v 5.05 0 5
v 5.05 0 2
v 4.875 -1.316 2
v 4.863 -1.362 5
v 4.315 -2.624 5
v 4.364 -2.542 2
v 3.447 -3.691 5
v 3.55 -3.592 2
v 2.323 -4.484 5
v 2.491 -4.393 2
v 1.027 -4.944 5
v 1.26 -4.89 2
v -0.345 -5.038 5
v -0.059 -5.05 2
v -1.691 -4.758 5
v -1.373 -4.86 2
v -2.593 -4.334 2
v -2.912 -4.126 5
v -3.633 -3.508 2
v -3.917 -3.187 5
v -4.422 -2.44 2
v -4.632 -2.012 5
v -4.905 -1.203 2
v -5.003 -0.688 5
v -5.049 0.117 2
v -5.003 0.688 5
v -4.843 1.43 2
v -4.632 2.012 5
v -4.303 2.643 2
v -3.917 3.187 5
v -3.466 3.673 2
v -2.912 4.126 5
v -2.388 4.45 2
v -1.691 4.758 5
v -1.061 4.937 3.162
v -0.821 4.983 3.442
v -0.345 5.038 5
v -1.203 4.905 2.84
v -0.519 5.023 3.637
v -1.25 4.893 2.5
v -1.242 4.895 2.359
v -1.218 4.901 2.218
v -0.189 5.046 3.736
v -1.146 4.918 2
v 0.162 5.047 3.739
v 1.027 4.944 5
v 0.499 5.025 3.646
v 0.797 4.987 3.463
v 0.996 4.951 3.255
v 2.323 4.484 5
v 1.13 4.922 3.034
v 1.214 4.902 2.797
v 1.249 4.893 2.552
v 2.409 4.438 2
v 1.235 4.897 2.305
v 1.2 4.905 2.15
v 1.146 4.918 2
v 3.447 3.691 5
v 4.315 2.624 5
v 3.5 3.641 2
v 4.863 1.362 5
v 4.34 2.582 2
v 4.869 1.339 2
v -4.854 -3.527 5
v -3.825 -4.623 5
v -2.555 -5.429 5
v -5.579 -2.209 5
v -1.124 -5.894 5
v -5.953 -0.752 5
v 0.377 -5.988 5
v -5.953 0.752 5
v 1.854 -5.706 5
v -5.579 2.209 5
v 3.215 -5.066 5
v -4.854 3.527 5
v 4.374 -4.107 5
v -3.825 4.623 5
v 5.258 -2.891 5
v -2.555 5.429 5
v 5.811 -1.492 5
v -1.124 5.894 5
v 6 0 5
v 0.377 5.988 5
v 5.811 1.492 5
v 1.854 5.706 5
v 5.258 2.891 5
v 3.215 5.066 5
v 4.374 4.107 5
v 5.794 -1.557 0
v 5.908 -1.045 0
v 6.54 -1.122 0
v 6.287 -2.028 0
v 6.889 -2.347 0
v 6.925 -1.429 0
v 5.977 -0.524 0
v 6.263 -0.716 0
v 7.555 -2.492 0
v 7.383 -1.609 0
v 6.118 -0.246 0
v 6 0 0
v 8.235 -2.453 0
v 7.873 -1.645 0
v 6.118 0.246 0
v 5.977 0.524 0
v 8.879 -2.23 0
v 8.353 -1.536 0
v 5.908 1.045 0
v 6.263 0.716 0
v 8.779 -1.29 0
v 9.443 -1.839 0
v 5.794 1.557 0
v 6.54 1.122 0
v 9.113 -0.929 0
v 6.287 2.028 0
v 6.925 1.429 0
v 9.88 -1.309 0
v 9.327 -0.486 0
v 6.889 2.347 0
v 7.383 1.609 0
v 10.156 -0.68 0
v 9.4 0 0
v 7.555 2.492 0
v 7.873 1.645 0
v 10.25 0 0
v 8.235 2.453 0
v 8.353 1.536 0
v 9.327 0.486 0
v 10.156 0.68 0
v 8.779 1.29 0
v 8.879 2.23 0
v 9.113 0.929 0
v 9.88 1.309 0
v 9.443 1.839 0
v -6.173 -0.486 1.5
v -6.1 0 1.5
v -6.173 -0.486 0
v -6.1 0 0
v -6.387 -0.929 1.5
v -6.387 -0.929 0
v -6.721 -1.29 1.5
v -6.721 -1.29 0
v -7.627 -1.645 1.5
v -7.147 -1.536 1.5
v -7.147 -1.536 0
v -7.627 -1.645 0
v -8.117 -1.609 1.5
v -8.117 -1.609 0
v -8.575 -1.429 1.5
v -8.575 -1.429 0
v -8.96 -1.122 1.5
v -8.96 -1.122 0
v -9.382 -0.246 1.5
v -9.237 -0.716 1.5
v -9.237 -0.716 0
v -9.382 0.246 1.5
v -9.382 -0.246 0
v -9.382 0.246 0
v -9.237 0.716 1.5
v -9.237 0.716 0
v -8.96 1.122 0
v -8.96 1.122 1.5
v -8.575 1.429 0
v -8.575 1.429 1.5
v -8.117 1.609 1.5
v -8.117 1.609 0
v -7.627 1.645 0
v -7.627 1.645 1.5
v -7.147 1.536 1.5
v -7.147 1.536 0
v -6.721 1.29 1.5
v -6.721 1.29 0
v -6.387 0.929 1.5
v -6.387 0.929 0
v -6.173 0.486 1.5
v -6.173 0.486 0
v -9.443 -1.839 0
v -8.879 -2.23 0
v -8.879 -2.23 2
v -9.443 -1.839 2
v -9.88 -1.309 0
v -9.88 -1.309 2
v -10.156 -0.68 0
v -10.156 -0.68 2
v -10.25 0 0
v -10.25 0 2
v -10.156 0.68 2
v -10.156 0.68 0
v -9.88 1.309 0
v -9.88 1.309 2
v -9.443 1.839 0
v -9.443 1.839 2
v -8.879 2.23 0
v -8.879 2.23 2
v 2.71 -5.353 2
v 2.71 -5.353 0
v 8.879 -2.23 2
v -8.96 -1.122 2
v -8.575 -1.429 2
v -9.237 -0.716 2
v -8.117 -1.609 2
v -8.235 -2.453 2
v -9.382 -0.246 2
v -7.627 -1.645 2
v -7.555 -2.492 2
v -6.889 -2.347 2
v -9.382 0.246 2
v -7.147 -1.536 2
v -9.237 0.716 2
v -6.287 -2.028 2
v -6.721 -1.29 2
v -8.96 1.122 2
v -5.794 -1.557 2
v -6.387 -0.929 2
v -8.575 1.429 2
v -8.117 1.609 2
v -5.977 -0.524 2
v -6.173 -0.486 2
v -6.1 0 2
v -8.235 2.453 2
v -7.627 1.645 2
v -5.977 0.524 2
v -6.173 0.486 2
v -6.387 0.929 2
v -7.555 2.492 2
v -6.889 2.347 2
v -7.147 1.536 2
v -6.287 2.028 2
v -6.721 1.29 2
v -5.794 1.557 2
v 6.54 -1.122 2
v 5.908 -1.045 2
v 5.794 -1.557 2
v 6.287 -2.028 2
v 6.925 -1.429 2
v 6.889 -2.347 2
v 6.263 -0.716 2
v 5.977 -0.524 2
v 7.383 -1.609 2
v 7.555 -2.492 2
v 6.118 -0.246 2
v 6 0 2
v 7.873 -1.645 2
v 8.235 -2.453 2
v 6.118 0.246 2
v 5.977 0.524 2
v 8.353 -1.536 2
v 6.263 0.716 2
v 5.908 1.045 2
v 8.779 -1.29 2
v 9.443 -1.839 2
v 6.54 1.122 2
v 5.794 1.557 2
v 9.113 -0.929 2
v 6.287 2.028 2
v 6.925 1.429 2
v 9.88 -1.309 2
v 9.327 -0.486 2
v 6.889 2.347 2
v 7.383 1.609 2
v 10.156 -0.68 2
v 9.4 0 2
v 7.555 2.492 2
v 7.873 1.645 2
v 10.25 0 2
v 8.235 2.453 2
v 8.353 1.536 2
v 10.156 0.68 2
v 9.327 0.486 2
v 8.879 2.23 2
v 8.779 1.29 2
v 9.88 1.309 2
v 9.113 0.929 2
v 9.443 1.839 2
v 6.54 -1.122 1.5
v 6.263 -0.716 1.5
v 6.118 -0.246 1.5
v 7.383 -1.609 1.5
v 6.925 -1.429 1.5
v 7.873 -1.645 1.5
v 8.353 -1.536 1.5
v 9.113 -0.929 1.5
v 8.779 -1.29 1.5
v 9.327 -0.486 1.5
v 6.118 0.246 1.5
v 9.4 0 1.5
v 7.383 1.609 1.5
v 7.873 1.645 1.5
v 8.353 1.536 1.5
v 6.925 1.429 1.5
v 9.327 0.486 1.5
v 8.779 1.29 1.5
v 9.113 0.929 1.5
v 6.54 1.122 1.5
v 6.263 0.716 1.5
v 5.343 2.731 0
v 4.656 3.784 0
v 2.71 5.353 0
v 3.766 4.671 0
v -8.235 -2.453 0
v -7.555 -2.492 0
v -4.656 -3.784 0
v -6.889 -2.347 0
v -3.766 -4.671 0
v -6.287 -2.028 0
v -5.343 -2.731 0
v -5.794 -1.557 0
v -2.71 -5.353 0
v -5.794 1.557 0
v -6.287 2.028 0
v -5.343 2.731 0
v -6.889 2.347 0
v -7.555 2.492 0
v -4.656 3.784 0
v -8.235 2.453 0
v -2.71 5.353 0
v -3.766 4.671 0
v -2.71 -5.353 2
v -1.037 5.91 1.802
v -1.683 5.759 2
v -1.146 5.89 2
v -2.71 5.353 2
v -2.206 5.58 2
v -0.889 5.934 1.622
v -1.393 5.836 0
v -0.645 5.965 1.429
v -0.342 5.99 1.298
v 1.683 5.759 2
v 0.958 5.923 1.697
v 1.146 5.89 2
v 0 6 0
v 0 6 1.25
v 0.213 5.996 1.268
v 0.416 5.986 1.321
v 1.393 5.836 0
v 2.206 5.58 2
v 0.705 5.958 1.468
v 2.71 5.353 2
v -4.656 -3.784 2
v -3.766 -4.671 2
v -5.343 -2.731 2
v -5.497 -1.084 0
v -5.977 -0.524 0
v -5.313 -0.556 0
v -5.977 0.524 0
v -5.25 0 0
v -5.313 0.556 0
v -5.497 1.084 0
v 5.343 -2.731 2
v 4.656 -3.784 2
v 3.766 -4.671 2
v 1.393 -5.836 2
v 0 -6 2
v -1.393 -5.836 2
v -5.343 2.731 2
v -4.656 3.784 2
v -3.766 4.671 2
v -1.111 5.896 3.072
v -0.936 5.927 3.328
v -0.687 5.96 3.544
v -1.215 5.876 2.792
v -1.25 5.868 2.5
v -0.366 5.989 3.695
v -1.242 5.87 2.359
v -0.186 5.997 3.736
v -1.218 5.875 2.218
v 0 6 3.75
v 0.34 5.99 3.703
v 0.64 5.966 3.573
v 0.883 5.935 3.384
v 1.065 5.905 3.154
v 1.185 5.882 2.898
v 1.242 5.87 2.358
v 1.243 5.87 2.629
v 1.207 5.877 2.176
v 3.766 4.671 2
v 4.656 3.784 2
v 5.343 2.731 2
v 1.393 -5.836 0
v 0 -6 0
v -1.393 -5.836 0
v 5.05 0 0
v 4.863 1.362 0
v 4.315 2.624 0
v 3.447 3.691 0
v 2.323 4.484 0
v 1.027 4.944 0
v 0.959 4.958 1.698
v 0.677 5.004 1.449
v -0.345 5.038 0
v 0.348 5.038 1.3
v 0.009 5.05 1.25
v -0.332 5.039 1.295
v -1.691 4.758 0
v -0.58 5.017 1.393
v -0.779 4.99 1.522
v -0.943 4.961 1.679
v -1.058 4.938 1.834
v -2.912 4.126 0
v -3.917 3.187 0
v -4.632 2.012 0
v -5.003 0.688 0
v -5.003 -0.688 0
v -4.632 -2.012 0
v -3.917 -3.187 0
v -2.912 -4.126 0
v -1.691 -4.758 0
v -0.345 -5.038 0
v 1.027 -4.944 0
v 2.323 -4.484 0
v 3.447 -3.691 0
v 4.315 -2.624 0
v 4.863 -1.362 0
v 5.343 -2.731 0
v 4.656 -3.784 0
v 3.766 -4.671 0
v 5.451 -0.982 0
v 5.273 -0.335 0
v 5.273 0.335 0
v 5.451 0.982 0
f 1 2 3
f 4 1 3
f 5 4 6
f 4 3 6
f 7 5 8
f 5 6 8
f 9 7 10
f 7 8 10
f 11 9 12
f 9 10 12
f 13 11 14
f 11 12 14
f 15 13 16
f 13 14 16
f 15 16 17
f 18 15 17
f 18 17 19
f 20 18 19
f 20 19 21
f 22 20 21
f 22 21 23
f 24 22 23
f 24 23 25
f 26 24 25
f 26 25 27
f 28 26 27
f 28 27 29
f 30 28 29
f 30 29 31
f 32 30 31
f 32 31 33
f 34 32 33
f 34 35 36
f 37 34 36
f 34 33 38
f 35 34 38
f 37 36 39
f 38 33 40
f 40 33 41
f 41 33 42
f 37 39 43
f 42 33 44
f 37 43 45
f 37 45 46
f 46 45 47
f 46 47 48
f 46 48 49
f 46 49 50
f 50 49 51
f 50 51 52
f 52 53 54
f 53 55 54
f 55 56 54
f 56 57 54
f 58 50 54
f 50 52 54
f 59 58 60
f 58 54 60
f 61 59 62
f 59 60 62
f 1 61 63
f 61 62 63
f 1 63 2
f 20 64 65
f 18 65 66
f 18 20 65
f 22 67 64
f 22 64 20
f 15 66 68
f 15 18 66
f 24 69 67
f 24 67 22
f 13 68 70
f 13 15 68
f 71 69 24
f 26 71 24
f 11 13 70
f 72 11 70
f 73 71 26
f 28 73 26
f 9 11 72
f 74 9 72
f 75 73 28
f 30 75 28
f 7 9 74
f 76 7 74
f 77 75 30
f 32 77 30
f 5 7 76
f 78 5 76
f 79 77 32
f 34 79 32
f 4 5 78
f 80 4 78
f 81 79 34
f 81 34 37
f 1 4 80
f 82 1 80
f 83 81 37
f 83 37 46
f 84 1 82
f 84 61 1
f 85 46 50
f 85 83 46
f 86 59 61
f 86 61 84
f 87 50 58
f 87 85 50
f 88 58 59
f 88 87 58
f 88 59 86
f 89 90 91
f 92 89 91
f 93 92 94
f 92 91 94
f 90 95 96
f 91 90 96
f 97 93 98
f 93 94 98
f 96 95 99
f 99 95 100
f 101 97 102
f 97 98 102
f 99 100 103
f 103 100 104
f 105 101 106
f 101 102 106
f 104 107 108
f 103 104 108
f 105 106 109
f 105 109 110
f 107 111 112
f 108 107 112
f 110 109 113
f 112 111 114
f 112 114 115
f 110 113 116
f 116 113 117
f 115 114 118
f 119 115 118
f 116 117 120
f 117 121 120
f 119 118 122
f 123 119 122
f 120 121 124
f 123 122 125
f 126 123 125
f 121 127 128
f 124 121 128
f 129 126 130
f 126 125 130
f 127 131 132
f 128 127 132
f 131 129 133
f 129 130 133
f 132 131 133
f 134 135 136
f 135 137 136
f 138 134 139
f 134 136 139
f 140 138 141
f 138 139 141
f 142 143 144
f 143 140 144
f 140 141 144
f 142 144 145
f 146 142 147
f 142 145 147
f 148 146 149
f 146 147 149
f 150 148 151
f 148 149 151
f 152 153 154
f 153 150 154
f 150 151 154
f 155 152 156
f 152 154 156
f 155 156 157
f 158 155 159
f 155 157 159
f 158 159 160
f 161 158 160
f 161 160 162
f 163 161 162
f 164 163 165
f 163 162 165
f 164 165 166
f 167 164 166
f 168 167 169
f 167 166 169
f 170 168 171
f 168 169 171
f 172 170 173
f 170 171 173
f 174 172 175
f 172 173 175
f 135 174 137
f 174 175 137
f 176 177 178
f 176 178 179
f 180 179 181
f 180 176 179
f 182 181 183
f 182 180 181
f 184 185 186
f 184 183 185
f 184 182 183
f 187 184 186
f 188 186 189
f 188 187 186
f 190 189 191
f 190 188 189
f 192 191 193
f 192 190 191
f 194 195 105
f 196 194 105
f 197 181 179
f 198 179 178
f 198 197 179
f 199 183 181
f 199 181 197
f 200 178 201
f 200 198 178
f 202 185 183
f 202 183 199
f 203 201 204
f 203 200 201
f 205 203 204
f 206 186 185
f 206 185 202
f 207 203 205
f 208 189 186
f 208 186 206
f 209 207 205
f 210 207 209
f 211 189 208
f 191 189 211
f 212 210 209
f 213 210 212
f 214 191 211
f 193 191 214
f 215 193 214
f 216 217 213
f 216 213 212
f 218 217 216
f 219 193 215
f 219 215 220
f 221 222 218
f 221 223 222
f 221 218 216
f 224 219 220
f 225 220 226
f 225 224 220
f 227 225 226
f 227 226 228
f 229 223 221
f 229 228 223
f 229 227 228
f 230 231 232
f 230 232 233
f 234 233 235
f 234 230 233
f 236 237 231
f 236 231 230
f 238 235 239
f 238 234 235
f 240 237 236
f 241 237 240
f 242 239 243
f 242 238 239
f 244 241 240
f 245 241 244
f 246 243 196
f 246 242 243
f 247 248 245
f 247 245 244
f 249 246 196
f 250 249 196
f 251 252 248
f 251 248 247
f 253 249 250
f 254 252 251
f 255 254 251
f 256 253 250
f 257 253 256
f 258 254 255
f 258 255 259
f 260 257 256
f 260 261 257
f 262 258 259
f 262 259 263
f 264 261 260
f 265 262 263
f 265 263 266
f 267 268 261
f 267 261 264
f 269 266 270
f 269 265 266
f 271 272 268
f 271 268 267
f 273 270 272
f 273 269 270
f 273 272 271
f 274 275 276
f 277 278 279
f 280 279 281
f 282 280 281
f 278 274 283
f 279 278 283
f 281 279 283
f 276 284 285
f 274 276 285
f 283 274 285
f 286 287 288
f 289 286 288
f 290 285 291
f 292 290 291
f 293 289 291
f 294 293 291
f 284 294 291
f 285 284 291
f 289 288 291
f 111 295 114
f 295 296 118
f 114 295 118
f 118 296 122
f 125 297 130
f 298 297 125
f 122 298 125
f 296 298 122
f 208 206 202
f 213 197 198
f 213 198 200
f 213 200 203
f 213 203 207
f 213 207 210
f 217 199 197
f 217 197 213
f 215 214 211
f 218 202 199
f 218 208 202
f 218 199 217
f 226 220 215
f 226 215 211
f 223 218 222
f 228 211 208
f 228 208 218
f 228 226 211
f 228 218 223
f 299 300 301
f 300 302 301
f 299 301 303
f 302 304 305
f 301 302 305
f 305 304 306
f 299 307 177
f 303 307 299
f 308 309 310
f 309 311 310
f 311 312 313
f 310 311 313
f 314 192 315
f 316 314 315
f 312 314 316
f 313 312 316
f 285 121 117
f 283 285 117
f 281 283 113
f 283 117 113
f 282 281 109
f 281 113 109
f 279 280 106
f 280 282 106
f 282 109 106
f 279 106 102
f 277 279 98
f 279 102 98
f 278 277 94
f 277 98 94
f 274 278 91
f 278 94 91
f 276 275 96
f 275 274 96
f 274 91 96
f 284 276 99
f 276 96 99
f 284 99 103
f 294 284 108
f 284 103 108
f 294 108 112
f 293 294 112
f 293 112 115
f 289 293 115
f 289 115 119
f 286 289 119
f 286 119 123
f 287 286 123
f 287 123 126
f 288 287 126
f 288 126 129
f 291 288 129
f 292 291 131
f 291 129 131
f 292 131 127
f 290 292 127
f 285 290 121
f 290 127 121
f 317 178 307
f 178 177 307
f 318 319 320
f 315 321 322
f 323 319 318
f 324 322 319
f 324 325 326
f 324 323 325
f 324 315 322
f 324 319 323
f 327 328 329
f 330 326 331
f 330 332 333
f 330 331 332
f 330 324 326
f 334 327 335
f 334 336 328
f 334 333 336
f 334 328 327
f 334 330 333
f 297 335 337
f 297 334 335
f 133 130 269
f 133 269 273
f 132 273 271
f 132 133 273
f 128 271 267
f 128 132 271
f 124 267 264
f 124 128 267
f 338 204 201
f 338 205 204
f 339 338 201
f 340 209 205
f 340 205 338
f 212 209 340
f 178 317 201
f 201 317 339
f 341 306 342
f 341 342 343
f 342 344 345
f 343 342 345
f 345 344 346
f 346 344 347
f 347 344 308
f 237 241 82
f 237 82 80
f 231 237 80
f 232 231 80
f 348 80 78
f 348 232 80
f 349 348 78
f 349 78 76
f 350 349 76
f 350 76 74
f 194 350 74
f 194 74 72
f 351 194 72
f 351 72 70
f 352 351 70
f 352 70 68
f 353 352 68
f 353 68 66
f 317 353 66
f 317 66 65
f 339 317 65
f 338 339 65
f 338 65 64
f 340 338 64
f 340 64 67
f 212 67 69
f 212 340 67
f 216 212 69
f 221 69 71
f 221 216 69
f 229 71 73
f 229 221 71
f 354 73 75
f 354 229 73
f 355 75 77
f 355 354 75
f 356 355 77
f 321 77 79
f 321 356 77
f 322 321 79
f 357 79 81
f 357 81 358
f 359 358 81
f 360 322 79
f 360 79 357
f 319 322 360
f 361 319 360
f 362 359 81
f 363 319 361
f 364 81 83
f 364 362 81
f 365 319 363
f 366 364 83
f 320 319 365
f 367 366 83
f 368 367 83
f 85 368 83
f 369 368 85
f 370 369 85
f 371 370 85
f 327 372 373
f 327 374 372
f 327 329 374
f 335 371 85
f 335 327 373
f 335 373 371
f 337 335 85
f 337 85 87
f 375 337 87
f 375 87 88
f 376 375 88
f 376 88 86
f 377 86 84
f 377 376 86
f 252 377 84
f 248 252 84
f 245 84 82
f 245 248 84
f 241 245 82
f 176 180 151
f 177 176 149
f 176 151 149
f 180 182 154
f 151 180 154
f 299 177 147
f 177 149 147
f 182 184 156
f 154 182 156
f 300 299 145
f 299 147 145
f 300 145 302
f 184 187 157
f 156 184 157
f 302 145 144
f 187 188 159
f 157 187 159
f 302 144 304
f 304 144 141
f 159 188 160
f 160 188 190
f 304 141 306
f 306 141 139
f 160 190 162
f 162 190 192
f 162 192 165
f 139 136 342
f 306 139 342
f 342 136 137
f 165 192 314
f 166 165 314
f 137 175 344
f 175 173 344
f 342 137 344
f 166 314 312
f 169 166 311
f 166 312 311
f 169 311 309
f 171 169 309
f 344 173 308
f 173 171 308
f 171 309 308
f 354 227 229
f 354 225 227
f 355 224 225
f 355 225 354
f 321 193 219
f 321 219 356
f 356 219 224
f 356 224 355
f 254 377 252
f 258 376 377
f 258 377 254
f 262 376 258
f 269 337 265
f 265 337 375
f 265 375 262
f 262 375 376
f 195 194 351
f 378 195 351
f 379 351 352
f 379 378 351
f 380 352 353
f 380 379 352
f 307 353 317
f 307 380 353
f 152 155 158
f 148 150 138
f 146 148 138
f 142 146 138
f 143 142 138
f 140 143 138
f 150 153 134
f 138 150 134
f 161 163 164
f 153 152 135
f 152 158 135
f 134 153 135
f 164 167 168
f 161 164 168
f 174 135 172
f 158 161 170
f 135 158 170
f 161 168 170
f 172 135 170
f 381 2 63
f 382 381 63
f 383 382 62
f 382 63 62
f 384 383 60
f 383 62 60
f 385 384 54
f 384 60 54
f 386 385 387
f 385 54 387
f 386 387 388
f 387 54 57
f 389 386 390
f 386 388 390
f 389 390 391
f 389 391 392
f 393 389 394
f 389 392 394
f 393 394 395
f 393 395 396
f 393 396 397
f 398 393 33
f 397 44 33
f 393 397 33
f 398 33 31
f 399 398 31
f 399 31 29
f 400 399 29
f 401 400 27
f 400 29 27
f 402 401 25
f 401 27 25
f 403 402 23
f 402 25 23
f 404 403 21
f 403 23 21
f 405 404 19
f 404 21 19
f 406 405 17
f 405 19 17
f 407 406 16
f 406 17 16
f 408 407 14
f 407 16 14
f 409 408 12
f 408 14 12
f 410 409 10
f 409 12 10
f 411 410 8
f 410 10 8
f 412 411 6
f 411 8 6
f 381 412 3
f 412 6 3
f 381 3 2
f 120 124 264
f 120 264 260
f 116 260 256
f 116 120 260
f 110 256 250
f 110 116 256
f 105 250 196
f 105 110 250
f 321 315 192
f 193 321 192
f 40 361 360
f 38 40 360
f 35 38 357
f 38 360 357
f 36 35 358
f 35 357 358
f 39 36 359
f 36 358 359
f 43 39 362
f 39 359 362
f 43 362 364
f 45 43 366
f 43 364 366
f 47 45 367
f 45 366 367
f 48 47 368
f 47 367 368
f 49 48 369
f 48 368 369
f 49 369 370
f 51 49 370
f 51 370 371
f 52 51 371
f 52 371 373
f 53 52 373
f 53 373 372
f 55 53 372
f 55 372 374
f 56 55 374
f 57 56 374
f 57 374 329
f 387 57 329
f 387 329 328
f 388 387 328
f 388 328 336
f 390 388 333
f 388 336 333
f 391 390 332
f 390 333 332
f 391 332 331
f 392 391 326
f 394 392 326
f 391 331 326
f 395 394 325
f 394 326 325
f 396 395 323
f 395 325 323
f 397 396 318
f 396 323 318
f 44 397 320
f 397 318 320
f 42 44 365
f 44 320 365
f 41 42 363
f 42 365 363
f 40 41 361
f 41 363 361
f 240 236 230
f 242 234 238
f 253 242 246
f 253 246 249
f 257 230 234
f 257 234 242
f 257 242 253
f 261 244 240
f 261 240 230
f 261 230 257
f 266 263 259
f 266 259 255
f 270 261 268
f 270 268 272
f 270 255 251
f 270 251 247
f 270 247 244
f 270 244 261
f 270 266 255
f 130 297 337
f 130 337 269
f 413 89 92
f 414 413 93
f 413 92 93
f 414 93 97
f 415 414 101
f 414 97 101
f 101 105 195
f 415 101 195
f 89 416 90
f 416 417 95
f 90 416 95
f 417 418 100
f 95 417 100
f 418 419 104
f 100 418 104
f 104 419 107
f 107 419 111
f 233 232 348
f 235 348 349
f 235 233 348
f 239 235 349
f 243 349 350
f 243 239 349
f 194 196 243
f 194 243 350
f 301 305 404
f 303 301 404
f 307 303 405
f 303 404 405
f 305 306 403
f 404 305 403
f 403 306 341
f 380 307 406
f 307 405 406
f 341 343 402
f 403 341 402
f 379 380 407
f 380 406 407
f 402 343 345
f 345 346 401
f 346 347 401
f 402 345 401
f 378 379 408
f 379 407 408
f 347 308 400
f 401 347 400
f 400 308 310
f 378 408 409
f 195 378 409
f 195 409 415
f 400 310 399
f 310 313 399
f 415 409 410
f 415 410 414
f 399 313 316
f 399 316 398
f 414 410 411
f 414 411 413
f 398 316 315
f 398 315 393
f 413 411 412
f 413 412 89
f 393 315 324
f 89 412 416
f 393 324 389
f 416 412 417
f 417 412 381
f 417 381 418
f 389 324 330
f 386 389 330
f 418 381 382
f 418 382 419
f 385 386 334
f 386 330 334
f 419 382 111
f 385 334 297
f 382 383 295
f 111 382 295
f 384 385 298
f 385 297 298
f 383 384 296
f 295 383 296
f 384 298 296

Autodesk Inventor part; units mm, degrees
ref_plane "YZ Plane" through (0, 0, 0) normal (1, 0, 0) x (0, 1, 0)
ref_plane "XY Plane" through (0, 0, 0) normal (0, 0, 1) x (1, 0, 0)
sketch "Sketch2" plane through (0, 0, 0) normal (0, 0, 1) x (1, 0, 0)
  circle A0 centre (0, 0) radius 5.05
  circle A1 centre (-7.75, 0) radius 1.65
  circle A2 centre (-7.75, 0) radius 2.5
  circle A3 centre (0, 0) radius 6
  line L0 (-2.7097, 5.3533) -> (-8.879, 2.2305)
  line L1 (-8.879, -2.2305) -> (-2.7097, -5.3533)
  circle A4 centre (7.75, 0) radius 1.65
  circle A5 centre (7.75, 0) radius 2.5
  line L2 (2.7097, 5.3533) -> (8.879, 2.2305)
  line L3 (2.7097, -5.3533) -> (8.879, -2.2305)
  line L4 (0, 0) -> (7.75, 0) construction
  line L5 (0, 0) -> (-7.75, 0) construction
  dimension "d0" = 10.1
  dimension "d1" = 3.3
  dimension "d2" = 5
  dimension "d3" = 12
  dimension "d27" = 7.75
sketch "Sketch5" plane through (0, 0, 0) normal (0, 0, 1) x (1, 0, 0)
  circle A0 centre (0, 0) radius 6 projected
  circle A1 centre (0, 0) radius 5.05 projected
extrude "Extrusion5" add sketch "Sketch5" along normal blind 5
extrude "Extrusion6" add sketch "Sketch2" along normal blind 2 contours A0 | A2 A3 | L0 A3 A2 | A2 A3 L1 | A3 A5 A2 | A2 A3 | L2 A5 A3 | A3 A5 L3 | A5 A3 | A3 A5
sketch "Sketch6" plane through (0, 0, 2) normal (0, 0, 1) x (1, 0, 0)
  circle A0 centre (0, 0) radius 5.05 projected
extrude "Extrusion7" cut sketch "Sketch6" against normal through all
sketch "Sketch7" plane through (0, 0, 2) normal (0, 0, 1) x (1, 0, 0)
  circle A0 centre (-7.75, 0) radius 1.65 projected
  circle A1 centre (7.75, 0) radius 1.65 projected
  point P0 (0, 0)
extrude "Extrusion9" add sketch "Sketch7" against normal blind 0.5
ref_plane "Work Plane3" through (0, 6, 0) normal (0, 1, 0) x (-1, 0, 0)
sketch "Sketch8" plane through (0, 6, 0) normal (0, 1, 0) x (-1, 0, 0)
  line L0 (-5.05, 0) -> (-5.05, 5) projected
  circle A0 centre (0, 2.5) radius 1.25
  point P0 (0, 0)
  point P1 (-5.05, 2.5)
  dimension "d24" = 2.5
extrude "Extrusion10" cut sketch "Sketch8" against normal blind 3
properties part number "ShaftCollarMagnetMount" material "ABS Plastic"
